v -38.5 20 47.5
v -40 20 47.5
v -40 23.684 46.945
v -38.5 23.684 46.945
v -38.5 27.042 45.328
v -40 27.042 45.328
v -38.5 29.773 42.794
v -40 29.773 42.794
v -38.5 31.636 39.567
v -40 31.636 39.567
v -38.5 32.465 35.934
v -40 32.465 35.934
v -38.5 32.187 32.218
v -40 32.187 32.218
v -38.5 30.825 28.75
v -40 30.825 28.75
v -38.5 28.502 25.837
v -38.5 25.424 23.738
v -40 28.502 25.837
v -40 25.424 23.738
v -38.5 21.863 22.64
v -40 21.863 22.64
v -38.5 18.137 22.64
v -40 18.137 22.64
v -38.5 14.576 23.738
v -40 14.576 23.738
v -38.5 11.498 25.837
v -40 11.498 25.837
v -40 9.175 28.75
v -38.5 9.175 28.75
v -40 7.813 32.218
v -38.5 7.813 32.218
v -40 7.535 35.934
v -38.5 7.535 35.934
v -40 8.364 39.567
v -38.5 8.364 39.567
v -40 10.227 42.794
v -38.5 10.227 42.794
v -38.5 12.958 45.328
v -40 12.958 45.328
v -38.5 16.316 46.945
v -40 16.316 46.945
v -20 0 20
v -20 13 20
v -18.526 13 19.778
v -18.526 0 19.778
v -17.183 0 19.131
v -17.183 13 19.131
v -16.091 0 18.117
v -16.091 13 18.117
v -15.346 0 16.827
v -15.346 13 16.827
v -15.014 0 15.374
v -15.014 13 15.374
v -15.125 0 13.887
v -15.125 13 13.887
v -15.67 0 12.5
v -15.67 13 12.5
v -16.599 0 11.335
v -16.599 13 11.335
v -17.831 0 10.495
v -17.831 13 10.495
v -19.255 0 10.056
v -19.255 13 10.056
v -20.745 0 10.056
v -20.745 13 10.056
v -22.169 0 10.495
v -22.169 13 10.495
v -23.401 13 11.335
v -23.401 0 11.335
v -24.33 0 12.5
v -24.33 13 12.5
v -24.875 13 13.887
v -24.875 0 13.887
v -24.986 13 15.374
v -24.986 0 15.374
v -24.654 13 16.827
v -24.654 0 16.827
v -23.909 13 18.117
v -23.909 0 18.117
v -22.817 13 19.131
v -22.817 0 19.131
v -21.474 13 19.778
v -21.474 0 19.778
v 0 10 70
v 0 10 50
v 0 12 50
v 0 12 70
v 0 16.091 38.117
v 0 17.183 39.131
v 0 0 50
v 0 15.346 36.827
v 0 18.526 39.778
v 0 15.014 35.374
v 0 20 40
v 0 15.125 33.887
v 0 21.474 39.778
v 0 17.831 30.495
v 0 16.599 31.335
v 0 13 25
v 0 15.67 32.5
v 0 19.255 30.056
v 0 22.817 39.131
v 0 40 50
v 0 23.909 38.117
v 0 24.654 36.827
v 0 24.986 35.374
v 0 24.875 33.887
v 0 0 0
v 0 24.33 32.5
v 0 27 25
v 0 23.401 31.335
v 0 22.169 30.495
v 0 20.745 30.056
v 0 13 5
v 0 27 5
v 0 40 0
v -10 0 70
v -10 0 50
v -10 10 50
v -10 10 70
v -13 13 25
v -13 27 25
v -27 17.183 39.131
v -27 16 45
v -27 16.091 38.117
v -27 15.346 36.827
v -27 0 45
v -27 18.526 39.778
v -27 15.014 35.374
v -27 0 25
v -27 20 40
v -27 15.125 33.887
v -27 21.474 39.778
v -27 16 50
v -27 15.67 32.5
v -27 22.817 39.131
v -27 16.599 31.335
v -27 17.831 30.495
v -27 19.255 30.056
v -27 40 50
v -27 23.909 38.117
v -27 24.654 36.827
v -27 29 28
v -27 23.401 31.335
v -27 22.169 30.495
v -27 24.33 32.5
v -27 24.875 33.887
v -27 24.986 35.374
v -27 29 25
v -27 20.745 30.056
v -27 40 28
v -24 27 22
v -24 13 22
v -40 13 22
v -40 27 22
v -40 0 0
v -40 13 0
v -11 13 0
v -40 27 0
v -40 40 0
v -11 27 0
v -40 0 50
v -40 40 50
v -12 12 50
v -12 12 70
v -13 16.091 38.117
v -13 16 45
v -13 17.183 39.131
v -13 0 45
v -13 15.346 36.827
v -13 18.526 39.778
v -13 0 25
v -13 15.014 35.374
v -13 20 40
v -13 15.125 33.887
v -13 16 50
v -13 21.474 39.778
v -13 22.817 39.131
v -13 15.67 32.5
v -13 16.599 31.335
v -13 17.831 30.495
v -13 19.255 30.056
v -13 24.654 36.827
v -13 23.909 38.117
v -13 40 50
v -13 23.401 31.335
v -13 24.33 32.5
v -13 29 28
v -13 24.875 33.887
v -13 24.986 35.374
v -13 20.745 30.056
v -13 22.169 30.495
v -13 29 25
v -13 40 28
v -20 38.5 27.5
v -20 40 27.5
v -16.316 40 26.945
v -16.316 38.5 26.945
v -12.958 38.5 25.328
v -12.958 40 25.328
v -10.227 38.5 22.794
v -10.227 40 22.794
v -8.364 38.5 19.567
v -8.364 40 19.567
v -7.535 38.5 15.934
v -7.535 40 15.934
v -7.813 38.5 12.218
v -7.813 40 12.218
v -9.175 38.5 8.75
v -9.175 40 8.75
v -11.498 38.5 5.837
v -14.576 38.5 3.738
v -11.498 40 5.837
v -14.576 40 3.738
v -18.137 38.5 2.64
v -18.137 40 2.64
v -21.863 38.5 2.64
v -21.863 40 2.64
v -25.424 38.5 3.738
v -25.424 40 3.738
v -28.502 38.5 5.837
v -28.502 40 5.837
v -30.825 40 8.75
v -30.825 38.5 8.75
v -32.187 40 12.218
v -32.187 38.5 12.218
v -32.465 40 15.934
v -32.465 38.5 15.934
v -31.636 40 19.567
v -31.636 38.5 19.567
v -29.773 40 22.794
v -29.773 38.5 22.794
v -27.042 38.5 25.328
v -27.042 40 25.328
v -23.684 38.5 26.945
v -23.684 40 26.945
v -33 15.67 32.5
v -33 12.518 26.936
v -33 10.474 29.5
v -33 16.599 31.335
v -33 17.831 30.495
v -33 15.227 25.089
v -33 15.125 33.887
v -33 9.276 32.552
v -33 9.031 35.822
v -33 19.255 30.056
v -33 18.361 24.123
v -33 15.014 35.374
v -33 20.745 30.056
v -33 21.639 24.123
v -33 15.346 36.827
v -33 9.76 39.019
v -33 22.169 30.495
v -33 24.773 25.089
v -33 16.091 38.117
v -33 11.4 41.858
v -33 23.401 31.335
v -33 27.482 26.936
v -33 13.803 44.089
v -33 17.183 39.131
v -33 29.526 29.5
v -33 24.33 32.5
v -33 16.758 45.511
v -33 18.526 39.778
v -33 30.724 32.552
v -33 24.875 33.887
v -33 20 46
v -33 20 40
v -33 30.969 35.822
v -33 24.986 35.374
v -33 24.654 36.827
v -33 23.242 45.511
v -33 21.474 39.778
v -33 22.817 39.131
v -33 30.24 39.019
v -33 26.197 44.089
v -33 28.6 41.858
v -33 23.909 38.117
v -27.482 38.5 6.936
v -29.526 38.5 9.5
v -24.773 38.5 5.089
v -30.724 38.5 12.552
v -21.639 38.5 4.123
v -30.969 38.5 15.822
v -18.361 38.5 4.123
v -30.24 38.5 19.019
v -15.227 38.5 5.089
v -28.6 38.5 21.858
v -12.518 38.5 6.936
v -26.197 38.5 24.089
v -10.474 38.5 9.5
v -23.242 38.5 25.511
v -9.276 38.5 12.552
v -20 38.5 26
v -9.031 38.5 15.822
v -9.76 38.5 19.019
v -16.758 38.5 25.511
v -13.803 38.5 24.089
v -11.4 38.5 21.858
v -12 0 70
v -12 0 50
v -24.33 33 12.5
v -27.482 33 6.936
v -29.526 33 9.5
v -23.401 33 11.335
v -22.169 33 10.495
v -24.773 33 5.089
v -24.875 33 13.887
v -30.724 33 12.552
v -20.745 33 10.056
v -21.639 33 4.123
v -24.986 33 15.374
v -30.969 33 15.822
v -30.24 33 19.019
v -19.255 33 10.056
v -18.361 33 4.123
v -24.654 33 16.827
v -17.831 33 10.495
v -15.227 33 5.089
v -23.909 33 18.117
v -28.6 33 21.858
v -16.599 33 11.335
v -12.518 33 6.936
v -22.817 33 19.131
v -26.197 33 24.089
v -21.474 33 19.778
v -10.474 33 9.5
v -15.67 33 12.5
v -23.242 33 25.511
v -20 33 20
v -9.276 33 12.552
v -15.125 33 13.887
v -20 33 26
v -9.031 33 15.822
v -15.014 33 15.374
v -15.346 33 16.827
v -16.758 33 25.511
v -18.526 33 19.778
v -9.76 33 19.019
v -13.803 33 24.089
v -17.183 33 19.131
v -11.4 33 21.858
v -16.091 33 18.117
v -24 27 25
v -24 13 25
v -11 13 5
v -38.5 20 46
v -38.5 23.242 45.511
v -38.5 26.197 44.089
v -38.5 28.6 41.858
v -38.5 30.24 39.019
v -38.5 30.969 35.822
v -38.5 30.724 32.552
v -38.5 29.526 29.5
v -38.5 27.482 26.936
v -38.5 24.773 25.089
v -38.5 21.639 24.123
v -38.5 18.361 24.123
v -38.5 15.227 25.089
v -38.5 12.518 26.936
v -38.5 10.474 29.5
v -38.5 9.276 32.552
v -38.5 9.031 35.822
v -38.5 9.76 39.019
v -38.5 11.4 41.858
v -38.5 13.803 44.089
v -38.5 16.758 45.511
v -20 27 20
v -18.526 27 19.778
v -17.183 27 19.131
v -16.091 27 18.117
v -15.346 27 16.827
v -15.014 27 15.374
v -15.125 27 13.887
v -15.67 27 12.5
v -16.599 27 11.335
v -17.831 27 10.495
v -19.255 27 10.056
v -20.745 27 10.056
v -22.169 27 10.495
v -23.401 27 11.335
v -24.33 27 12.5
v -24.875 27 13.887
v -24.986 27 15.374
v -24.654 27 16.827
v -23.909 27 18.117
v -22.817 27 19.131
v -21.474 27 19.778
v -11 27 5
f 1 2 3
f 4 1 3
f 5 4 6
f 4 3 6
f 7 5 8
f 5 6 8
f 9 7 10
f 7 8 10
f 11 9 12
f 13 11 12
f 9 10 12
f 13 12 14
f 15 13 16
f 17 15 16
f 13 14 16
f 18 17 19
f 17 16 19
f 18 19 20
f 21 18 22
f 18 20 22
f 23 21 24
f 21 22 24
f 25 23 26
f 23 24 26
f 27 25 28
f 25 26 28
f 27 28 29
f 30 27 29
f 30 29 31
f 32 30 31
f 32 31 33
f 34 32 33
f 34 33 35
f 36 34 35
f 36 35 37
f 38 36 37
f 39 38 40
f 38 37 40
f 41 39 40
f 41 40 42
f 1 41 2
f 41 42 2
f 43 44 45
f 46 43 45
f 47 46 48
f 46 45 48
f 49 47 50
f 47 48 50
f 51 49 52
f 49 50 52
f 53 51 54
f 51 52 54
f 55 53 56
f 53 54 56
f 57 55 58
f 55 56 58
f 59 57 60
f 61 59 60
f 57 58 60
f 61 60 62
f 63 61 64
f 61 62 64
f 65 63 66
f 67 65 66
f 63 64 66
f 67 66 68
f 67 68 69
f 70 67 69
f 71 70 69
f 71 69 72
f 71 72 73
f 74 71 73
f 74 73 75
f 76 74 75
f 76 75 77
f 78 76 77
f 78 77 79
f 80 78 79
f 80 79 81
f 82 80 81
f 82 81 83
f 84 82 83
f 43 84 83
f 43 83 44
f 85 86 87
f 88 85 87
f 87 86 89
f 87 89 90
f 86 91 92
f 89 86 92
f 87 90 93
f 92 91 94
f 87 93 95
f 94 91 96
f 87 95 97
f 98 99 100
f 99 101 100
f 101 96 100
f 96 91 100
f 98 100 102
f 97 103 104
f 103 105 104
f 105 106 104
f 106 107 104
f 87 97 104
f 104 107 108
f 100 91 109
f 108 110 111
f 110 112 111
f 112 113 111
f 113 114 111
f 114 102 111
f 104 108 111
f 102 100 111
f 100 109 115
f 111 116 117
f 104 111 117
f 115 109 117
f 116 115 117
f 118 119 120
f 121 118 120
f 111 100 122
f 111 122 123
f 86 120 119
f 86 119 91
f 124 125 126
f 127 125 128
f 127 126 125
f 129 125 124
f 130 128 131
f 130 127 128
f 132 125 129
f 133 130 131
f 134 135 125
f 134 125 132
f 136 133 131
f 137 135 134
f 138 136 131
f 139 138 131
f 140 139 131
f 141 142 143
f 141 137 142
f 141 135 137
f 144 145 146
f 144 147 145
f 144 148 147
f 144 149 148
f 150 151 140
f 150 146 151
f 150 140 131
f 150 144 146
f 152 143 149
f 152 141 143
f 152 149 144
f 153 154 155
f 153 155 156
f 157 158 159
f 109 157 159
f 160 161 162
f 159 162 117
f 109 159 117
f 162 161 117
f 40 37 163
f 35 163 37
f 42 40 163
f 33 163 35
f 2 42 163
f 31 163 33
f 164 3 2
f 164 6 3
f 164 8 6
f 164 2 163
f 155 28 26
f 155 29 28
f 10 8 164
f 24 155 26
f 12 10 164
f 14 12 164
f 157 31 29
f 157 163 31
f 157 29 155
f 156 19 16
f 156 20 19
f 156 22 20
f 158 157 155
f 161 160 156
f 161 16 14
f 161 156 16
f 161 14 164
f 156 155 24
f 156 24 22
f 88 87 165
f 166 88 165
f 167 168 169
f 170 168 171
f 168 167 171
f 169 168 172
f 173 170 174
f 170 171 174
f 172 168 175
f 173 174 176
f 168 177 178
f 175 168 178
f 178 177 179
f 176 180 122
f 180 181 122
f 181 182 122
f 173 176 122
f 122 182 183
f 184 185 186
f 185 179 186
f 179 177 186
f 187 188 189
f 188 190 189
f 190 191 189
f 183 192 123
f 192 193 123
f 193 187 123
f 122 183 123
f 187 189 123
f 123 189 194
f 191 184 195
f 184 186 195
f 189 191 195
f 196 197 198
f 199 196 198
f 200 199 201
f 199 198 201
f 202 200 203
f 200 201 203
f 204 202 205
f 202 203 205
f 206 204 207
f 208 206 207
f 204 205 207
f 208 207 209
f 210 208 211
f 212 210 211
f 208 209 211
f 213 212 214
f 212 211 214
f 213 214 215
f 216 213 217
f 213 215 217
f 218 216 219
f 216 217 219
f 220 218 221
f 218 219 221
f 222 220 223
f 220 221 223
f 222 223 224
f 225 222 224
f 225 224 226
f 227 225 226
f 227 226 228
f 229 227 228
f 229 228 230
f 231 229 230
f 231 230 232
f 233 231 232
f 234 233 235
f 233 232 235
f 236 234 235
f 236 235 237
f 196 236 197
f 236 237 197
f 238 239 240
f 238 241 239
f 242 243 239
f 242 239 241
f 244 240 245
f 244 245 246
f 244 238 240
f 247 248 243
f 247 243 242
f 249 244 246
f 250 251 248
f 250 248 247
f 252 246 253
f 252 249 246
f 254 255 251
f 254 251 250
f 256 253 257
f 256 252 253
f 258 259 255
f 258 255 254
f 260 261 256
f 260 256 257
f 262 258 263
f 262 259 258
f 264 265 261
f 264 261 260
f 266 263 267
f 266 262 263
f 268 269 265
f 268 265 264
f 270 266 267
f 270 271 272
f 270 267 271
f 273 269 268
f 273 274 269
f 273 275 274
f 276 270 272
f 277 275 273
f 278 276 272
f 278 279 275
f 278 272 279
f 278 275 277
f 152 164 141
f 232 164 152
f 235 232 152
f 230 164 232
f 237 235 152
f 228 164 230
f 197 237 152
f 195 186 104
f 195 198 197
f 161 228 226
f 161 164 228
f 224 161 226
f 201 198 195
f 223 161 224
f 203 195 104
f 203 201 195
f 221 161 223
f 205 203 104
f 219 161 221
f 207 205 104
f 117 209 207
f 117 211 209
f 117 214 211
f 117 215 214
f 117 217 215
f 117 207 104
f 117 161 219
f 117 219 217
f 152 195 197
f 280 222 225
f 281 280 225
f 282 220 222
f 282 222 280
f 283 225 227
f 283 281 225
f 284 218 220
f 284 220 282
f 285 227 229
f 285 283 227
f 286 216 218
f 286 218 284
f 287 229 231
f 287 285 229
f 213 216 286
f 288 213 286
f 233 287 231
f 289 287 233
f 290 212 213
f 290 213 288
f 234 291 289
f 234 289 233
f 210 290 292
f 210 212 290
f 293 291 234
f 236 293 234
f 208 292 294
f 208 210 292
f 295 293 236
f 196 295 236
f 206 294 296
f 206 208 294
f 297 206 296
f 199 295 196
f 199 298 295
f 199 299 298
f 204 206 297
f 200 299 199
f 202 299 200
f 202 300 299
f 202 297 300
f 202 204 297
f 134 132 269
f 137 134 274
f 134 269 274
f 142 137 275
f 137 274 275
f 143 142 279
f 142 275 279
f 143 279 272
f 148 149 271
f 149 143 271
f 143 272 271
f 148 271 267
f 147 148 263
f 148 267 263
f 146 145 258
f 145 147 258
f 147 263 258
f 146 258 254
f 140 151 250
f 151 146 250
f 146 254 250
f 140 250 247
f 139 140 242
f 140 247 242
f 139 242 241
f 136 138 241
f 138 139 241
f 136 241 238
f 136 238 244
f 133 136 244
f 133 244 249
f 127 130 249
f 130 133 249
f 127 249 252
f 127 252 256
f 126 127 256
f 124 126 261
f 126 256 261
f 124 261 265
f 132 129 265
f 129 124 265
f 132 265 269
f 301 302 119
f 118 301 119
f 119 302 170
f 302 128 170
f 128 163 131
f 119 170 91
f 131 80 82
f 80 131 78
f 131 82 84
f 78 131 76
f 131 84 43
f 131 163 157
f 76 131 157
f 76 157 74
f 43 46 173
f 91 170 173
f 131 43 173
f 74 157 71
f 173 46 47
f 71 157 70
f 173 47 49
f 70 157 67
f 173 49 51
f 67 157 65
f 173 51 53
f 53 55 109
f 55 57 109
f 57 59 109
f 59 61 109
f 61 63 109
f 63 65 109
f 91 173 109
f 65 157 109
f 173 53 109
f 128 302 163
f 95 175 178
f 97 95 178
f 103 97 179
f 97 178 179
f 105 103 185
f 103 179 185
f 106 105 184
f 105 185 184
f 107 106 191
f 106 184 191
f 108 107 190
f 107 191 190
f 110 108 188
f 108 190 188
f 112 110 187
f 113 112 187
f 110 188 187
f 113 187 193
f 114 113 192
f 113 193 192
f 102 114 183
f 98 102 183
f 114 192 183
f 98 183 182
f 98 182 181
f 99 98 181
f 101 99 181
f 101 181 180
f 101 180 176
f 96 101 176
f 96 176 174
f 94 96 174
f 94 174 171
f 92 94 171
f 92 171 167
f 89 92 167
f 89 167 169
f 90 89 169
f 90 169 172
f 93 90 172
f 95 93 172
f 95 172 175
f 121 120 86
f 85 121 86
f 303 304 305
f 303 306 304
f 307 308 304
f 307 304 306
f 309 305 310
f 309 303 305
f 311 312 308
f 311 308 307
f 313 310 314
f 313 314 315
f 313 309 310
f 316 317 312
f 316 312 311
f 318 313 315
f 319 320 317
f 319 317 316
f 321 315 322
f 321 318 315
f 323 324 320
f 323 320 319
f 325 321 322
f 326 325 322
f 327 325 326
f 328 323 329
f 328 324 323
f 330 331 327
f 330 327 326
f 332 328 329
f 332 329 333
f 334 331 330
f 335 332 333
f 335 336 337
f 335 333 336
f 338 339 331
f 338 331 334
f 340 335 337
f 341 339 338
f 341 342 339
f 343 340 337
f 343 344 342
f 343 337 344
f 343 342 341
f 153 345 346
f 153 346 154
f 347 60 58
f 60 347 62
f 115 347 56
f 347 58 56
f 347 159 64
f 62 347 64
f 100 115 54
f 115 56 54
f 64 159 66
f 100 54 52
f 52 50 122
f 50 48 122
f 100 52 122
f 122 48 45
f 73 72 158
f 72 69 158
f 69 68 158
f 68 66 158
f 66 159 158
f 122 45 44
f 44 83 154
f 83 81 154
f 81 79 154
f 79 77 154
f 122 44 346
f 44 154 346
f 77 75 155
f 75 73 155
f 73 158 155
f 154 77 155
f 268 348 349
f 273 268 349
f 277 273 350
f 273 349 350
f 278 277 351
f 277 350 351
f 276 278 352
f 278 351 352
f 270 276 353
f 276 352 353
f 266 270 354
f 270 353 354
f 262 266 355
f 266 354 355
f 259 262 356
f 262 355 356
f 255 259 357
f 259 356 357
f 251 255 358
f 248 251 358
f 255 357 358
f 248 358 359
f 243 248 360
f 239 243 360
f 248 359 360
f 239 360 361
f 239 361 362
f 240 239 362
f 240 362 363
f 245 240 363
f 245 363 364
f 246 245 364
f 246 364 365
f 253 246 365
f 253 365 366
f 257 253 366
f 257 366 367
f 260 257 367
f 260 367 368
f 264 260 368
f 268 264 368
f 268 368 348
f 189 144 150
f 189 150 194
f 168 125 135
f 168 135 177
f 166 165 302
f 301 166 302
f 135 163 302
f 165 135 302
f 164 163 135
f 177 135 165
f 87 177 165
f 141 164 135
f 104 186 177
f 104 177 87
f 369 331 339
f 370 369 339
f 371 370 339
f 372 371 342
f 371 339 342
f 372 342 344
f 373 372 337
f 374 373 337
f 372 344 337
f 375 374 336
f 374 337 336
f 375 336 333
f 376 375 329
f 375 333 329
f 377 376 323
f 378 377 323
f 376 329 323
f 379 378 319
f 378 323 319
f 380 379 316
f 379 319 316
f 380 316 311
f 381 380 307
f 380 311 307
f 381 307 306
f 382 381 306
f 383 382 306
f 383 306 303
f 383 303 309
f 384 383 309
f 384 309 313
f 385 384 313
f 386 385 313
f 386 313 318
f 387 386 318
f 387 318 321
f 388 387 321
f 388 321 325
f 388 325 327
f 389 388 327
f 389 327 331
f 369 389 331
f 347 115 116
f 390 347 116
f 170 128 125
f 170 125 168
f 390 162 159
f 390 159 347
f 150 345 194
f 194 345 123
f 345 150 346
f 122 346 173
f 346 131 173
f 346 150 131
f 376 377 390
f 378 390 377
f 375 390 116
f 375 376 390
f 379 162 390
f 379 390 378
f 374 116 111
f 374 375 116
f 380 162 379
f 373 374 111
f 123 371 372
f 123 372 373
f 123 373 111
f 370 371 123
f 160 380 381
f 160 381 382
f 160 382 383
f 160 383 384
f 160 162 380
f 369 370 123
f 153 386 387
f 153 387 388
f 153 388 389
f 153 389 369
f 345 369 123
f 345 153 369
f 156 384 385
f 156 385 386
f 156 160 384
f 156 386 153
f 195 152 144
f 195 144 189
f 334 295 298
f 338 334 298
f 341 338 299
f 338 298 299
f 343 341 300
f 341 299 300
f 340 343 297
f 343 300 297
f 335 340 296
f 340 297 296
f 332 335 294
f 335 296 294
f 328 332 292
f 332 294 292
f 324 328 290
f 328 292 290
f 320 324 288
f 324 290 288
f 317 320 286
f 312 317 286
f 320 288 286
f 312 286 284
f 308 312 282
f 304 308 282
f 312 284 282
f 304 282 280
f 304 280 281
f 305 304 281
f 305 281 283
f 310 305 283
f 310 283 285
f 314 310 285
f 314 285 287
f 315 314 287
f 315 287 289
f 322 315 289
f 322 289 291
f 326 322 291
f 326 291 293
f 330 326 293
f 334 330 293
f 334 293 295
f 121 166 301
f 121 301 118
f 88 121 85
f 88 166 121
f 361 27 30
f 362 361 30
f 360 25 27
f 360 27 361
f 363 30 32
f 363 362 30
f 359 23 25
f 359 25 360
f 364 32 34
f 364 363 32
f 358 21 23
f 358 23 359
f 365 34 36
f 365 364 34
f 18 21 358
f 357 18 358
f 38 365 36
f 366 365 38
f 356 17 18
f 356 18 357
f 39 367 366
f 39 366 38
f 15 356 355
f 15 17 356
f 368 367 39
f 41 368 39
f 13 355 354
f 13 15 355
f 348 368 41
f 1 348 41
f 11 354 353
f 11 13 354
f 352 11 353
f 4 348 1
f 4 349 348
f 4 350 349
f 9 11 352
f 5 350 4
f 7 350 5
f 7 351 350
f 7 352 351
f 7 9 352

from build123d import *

# Parameters (mm, degrees)
ESQUISSE1_W              = 40
ESQUISSE1_H              = 40
BOSS_EXTRU_1_DEPTH       = 50
ESQUISSE2_R              = 5
ENL_V_MAT_EXTRU_1_DEPTH  = 41
ESQUISSE3_R              = 5
ENL_V_MAT_EXTRU_2_DEPTH  = 41
ESQUISSE4_W              = 22
ESQUISSE4_H              = 14
ENL_V_MAT_EXTRU_3_DEPTH  = 29
ESQUISSE5_W              = 14
ESQUISSE5_H              = 20
ENL_V_MAT_EXTRU_4_DEPTH  = 29
ESQUISSE6_W              = 20
ESQUISSE6_H              = 14
ENL_V_MAT_EXTRU_5_DEPTH  = 24
ESQUISSE7_W              = 14
ESQUISSE7_H              = 22
ENL_V_MAT_EXTRU_6_DEPTH  = 24
ESQUISSE10_R             = 11
ENL_V_MAT_EXTRU_9_DEPTH  = 7
ESQUISSE11_R             = 12.5
ENL_V_MAT_EXTRU_10_DEPTH = 1.5
BOSS_EXTRU_2_DEPTH       = 20
ESQUISSE14_R             = 11
ENL_V_MAT_EXTRU_11_DEPTH = 7
ESQUISSE15_R             = 12.5
ENL_V_MAT_EXTRU_12_DEPTH = 1.5


with BuildPart() as part:
    # Esquisse1 → Boss.-Extru.1 (new body)
    with BuildSketch(Plane.XY):
        with Locations((-20, 20)):
            Rectangle(ESQUISSE1_W, ESQUISSE1_H)
    extrude(amount=BOSS_EXTRU_1_DEPTH)

    # Esquisse2 → Enlèv. mat.-Extru.1 (cut, through all)
    with BuildSketch(Plane(origin=(0, 40, 0), x_dir=(1, 0, 0), z_dir=(0, 1, 0))):
        with Locations(Location((-20, -15, 0), (0, 0, 270))):  # turned: the seam where the file's is
            Circle(ESQUISSE2_R)
    extrude(amount=-ENL_V_MAT_EXTRU_1_DEPTH, mode=Mode.SUBTRACT)

    # Esquisse3 → Enlèv. mat.-Extru.2 (cut, through all)
    with BuildSketch(Plane.ZY.offset(40)):
        with Locations((35, 20)):
            Circle(ESQUISSE3_R)
    extrude(amount=-ENL_V_MAT_EXTRU_2_DEPTH, mode=Mode.SUBTRACT)

    # Esquisse4 → Enlèv. mat.-Extru.3 (cut)
    with BuildSketch(Plane.ZY.offset(40)):
        with Locations((11, 20)):
            Rectangle(ESQUISSE4_W, ESQUISSE4_H)
    extrude(amount=-ENL_V_MAT_EXTRU_3_DEPTH, mode=Mode.SUBTRACT)

    # Esquisse5 → Enlèv. mat.-Extru.4 (cut)
    with BuildSketch(Plane.XZ):
        with Locations((-20, 35)):
            Rectangle(ESQUISSE5_W, ESQUISSE5_H)
    extrude(amount=-ENL_V_MAT_EXTRU_4_DEPTH, mode=Mode.SUBTRACT)

    # Esquisse6 → Enlèv. mat.-Extru.5 (cut)
    with BuildSketch(Plane(origin=(0, 0, 0), x_dir=(0, 0, -1), z_dir=(1, 0, 0))):
        with Locations((-15, 20)):
            Rectangle(ESQUISSE6_W, ESQUISSE6_H)
    extrude(amount=-ENL_V_MAT_EXTRU_5_DEPTH, mode=Mode.SUBTRACT)

    # Esquisse7 → Enlèv. mat.-Extru.6 (cut)
    with BuildSketch(Plane(origin=(0, 40, 0), x_dir=(1, 0, 0), z_dir=(0, 1, 0))):
        with Locations((-20, -39)):
            Rectangle(ESQUISSE7_W, ESQUISSE7_H)
    extrude(amount=-ENL_V_MAT_EXTRU_6_DEPTH, mode=Mode.SUBTRACT)

    # Esquisse10 → Enlèv. mat.-Extru.9 (cut)
    with BuildSketch(Plane(origin=(0, 40, 0), x_dir=(1, 0, 0), z_dir=(0, 1, 0))):
        with Locations(Location((-20, -15, 0), (0, 0, 270))):  # turned: the seam where the file's is
            Circle(ESQUISSE10_R)
    extrude(amount=-ENL_V_MAT_EXTRU_9_DEPTH, mode=Mode.SUBTRACT)

    # Esquisse11 → Enlèv. mat.-Extru.10 (cut)
    with BuildSketch(Plane(origin=(0, 40, 0), x_dir=(1, 0, 0), z_dir=(0, 1, 0))):
        with Locations(Location((-20, -15, 0), (0, 0, 270))):  # turned: the seam where the file's is
            Circle(ESQUISSE11_R)
    extrude(amount=-ENL_V_MAT_EXTRU_10_DEPTH, mode=Mode.SUBTRACT)

    # Esquisse13 → Boss.-Extru.2 (add)
    with BuildSketch(Plane.XY.offset(50)):
        Polygon((-10, 0), (-10, 10), (0, 10), (0, 12), (-12, 12), (-12, 0), align=None)
    extrude(amount=BOSS_EXTRU_2_DEPTH)

    # Esquisse14 → Enlèv. mat.-Extru.11 (cut)
    with BuildSketch(Plane.ZY.offset(40)):
        with Locations((35, 20)):
            Circle(ESQUISSE14_R)
    extrude(amount=-ENL_V_MAT_EXTRU_11_DEPTH, mode=Mode.SUBTRACT)

    # Esquisse15 → Enlèv. mat.-Extru.12 (cut)
    with BuildSketch(Plane.ZY.offset(40)):
        with Locations((35, 20)):
            Circle(ESQUISSE15_R)
    extrude(amount=-ENL_V_MAT_EXTRU_12_DEPTH, mode=Mode.SUBTRACT)


solid = part.part
